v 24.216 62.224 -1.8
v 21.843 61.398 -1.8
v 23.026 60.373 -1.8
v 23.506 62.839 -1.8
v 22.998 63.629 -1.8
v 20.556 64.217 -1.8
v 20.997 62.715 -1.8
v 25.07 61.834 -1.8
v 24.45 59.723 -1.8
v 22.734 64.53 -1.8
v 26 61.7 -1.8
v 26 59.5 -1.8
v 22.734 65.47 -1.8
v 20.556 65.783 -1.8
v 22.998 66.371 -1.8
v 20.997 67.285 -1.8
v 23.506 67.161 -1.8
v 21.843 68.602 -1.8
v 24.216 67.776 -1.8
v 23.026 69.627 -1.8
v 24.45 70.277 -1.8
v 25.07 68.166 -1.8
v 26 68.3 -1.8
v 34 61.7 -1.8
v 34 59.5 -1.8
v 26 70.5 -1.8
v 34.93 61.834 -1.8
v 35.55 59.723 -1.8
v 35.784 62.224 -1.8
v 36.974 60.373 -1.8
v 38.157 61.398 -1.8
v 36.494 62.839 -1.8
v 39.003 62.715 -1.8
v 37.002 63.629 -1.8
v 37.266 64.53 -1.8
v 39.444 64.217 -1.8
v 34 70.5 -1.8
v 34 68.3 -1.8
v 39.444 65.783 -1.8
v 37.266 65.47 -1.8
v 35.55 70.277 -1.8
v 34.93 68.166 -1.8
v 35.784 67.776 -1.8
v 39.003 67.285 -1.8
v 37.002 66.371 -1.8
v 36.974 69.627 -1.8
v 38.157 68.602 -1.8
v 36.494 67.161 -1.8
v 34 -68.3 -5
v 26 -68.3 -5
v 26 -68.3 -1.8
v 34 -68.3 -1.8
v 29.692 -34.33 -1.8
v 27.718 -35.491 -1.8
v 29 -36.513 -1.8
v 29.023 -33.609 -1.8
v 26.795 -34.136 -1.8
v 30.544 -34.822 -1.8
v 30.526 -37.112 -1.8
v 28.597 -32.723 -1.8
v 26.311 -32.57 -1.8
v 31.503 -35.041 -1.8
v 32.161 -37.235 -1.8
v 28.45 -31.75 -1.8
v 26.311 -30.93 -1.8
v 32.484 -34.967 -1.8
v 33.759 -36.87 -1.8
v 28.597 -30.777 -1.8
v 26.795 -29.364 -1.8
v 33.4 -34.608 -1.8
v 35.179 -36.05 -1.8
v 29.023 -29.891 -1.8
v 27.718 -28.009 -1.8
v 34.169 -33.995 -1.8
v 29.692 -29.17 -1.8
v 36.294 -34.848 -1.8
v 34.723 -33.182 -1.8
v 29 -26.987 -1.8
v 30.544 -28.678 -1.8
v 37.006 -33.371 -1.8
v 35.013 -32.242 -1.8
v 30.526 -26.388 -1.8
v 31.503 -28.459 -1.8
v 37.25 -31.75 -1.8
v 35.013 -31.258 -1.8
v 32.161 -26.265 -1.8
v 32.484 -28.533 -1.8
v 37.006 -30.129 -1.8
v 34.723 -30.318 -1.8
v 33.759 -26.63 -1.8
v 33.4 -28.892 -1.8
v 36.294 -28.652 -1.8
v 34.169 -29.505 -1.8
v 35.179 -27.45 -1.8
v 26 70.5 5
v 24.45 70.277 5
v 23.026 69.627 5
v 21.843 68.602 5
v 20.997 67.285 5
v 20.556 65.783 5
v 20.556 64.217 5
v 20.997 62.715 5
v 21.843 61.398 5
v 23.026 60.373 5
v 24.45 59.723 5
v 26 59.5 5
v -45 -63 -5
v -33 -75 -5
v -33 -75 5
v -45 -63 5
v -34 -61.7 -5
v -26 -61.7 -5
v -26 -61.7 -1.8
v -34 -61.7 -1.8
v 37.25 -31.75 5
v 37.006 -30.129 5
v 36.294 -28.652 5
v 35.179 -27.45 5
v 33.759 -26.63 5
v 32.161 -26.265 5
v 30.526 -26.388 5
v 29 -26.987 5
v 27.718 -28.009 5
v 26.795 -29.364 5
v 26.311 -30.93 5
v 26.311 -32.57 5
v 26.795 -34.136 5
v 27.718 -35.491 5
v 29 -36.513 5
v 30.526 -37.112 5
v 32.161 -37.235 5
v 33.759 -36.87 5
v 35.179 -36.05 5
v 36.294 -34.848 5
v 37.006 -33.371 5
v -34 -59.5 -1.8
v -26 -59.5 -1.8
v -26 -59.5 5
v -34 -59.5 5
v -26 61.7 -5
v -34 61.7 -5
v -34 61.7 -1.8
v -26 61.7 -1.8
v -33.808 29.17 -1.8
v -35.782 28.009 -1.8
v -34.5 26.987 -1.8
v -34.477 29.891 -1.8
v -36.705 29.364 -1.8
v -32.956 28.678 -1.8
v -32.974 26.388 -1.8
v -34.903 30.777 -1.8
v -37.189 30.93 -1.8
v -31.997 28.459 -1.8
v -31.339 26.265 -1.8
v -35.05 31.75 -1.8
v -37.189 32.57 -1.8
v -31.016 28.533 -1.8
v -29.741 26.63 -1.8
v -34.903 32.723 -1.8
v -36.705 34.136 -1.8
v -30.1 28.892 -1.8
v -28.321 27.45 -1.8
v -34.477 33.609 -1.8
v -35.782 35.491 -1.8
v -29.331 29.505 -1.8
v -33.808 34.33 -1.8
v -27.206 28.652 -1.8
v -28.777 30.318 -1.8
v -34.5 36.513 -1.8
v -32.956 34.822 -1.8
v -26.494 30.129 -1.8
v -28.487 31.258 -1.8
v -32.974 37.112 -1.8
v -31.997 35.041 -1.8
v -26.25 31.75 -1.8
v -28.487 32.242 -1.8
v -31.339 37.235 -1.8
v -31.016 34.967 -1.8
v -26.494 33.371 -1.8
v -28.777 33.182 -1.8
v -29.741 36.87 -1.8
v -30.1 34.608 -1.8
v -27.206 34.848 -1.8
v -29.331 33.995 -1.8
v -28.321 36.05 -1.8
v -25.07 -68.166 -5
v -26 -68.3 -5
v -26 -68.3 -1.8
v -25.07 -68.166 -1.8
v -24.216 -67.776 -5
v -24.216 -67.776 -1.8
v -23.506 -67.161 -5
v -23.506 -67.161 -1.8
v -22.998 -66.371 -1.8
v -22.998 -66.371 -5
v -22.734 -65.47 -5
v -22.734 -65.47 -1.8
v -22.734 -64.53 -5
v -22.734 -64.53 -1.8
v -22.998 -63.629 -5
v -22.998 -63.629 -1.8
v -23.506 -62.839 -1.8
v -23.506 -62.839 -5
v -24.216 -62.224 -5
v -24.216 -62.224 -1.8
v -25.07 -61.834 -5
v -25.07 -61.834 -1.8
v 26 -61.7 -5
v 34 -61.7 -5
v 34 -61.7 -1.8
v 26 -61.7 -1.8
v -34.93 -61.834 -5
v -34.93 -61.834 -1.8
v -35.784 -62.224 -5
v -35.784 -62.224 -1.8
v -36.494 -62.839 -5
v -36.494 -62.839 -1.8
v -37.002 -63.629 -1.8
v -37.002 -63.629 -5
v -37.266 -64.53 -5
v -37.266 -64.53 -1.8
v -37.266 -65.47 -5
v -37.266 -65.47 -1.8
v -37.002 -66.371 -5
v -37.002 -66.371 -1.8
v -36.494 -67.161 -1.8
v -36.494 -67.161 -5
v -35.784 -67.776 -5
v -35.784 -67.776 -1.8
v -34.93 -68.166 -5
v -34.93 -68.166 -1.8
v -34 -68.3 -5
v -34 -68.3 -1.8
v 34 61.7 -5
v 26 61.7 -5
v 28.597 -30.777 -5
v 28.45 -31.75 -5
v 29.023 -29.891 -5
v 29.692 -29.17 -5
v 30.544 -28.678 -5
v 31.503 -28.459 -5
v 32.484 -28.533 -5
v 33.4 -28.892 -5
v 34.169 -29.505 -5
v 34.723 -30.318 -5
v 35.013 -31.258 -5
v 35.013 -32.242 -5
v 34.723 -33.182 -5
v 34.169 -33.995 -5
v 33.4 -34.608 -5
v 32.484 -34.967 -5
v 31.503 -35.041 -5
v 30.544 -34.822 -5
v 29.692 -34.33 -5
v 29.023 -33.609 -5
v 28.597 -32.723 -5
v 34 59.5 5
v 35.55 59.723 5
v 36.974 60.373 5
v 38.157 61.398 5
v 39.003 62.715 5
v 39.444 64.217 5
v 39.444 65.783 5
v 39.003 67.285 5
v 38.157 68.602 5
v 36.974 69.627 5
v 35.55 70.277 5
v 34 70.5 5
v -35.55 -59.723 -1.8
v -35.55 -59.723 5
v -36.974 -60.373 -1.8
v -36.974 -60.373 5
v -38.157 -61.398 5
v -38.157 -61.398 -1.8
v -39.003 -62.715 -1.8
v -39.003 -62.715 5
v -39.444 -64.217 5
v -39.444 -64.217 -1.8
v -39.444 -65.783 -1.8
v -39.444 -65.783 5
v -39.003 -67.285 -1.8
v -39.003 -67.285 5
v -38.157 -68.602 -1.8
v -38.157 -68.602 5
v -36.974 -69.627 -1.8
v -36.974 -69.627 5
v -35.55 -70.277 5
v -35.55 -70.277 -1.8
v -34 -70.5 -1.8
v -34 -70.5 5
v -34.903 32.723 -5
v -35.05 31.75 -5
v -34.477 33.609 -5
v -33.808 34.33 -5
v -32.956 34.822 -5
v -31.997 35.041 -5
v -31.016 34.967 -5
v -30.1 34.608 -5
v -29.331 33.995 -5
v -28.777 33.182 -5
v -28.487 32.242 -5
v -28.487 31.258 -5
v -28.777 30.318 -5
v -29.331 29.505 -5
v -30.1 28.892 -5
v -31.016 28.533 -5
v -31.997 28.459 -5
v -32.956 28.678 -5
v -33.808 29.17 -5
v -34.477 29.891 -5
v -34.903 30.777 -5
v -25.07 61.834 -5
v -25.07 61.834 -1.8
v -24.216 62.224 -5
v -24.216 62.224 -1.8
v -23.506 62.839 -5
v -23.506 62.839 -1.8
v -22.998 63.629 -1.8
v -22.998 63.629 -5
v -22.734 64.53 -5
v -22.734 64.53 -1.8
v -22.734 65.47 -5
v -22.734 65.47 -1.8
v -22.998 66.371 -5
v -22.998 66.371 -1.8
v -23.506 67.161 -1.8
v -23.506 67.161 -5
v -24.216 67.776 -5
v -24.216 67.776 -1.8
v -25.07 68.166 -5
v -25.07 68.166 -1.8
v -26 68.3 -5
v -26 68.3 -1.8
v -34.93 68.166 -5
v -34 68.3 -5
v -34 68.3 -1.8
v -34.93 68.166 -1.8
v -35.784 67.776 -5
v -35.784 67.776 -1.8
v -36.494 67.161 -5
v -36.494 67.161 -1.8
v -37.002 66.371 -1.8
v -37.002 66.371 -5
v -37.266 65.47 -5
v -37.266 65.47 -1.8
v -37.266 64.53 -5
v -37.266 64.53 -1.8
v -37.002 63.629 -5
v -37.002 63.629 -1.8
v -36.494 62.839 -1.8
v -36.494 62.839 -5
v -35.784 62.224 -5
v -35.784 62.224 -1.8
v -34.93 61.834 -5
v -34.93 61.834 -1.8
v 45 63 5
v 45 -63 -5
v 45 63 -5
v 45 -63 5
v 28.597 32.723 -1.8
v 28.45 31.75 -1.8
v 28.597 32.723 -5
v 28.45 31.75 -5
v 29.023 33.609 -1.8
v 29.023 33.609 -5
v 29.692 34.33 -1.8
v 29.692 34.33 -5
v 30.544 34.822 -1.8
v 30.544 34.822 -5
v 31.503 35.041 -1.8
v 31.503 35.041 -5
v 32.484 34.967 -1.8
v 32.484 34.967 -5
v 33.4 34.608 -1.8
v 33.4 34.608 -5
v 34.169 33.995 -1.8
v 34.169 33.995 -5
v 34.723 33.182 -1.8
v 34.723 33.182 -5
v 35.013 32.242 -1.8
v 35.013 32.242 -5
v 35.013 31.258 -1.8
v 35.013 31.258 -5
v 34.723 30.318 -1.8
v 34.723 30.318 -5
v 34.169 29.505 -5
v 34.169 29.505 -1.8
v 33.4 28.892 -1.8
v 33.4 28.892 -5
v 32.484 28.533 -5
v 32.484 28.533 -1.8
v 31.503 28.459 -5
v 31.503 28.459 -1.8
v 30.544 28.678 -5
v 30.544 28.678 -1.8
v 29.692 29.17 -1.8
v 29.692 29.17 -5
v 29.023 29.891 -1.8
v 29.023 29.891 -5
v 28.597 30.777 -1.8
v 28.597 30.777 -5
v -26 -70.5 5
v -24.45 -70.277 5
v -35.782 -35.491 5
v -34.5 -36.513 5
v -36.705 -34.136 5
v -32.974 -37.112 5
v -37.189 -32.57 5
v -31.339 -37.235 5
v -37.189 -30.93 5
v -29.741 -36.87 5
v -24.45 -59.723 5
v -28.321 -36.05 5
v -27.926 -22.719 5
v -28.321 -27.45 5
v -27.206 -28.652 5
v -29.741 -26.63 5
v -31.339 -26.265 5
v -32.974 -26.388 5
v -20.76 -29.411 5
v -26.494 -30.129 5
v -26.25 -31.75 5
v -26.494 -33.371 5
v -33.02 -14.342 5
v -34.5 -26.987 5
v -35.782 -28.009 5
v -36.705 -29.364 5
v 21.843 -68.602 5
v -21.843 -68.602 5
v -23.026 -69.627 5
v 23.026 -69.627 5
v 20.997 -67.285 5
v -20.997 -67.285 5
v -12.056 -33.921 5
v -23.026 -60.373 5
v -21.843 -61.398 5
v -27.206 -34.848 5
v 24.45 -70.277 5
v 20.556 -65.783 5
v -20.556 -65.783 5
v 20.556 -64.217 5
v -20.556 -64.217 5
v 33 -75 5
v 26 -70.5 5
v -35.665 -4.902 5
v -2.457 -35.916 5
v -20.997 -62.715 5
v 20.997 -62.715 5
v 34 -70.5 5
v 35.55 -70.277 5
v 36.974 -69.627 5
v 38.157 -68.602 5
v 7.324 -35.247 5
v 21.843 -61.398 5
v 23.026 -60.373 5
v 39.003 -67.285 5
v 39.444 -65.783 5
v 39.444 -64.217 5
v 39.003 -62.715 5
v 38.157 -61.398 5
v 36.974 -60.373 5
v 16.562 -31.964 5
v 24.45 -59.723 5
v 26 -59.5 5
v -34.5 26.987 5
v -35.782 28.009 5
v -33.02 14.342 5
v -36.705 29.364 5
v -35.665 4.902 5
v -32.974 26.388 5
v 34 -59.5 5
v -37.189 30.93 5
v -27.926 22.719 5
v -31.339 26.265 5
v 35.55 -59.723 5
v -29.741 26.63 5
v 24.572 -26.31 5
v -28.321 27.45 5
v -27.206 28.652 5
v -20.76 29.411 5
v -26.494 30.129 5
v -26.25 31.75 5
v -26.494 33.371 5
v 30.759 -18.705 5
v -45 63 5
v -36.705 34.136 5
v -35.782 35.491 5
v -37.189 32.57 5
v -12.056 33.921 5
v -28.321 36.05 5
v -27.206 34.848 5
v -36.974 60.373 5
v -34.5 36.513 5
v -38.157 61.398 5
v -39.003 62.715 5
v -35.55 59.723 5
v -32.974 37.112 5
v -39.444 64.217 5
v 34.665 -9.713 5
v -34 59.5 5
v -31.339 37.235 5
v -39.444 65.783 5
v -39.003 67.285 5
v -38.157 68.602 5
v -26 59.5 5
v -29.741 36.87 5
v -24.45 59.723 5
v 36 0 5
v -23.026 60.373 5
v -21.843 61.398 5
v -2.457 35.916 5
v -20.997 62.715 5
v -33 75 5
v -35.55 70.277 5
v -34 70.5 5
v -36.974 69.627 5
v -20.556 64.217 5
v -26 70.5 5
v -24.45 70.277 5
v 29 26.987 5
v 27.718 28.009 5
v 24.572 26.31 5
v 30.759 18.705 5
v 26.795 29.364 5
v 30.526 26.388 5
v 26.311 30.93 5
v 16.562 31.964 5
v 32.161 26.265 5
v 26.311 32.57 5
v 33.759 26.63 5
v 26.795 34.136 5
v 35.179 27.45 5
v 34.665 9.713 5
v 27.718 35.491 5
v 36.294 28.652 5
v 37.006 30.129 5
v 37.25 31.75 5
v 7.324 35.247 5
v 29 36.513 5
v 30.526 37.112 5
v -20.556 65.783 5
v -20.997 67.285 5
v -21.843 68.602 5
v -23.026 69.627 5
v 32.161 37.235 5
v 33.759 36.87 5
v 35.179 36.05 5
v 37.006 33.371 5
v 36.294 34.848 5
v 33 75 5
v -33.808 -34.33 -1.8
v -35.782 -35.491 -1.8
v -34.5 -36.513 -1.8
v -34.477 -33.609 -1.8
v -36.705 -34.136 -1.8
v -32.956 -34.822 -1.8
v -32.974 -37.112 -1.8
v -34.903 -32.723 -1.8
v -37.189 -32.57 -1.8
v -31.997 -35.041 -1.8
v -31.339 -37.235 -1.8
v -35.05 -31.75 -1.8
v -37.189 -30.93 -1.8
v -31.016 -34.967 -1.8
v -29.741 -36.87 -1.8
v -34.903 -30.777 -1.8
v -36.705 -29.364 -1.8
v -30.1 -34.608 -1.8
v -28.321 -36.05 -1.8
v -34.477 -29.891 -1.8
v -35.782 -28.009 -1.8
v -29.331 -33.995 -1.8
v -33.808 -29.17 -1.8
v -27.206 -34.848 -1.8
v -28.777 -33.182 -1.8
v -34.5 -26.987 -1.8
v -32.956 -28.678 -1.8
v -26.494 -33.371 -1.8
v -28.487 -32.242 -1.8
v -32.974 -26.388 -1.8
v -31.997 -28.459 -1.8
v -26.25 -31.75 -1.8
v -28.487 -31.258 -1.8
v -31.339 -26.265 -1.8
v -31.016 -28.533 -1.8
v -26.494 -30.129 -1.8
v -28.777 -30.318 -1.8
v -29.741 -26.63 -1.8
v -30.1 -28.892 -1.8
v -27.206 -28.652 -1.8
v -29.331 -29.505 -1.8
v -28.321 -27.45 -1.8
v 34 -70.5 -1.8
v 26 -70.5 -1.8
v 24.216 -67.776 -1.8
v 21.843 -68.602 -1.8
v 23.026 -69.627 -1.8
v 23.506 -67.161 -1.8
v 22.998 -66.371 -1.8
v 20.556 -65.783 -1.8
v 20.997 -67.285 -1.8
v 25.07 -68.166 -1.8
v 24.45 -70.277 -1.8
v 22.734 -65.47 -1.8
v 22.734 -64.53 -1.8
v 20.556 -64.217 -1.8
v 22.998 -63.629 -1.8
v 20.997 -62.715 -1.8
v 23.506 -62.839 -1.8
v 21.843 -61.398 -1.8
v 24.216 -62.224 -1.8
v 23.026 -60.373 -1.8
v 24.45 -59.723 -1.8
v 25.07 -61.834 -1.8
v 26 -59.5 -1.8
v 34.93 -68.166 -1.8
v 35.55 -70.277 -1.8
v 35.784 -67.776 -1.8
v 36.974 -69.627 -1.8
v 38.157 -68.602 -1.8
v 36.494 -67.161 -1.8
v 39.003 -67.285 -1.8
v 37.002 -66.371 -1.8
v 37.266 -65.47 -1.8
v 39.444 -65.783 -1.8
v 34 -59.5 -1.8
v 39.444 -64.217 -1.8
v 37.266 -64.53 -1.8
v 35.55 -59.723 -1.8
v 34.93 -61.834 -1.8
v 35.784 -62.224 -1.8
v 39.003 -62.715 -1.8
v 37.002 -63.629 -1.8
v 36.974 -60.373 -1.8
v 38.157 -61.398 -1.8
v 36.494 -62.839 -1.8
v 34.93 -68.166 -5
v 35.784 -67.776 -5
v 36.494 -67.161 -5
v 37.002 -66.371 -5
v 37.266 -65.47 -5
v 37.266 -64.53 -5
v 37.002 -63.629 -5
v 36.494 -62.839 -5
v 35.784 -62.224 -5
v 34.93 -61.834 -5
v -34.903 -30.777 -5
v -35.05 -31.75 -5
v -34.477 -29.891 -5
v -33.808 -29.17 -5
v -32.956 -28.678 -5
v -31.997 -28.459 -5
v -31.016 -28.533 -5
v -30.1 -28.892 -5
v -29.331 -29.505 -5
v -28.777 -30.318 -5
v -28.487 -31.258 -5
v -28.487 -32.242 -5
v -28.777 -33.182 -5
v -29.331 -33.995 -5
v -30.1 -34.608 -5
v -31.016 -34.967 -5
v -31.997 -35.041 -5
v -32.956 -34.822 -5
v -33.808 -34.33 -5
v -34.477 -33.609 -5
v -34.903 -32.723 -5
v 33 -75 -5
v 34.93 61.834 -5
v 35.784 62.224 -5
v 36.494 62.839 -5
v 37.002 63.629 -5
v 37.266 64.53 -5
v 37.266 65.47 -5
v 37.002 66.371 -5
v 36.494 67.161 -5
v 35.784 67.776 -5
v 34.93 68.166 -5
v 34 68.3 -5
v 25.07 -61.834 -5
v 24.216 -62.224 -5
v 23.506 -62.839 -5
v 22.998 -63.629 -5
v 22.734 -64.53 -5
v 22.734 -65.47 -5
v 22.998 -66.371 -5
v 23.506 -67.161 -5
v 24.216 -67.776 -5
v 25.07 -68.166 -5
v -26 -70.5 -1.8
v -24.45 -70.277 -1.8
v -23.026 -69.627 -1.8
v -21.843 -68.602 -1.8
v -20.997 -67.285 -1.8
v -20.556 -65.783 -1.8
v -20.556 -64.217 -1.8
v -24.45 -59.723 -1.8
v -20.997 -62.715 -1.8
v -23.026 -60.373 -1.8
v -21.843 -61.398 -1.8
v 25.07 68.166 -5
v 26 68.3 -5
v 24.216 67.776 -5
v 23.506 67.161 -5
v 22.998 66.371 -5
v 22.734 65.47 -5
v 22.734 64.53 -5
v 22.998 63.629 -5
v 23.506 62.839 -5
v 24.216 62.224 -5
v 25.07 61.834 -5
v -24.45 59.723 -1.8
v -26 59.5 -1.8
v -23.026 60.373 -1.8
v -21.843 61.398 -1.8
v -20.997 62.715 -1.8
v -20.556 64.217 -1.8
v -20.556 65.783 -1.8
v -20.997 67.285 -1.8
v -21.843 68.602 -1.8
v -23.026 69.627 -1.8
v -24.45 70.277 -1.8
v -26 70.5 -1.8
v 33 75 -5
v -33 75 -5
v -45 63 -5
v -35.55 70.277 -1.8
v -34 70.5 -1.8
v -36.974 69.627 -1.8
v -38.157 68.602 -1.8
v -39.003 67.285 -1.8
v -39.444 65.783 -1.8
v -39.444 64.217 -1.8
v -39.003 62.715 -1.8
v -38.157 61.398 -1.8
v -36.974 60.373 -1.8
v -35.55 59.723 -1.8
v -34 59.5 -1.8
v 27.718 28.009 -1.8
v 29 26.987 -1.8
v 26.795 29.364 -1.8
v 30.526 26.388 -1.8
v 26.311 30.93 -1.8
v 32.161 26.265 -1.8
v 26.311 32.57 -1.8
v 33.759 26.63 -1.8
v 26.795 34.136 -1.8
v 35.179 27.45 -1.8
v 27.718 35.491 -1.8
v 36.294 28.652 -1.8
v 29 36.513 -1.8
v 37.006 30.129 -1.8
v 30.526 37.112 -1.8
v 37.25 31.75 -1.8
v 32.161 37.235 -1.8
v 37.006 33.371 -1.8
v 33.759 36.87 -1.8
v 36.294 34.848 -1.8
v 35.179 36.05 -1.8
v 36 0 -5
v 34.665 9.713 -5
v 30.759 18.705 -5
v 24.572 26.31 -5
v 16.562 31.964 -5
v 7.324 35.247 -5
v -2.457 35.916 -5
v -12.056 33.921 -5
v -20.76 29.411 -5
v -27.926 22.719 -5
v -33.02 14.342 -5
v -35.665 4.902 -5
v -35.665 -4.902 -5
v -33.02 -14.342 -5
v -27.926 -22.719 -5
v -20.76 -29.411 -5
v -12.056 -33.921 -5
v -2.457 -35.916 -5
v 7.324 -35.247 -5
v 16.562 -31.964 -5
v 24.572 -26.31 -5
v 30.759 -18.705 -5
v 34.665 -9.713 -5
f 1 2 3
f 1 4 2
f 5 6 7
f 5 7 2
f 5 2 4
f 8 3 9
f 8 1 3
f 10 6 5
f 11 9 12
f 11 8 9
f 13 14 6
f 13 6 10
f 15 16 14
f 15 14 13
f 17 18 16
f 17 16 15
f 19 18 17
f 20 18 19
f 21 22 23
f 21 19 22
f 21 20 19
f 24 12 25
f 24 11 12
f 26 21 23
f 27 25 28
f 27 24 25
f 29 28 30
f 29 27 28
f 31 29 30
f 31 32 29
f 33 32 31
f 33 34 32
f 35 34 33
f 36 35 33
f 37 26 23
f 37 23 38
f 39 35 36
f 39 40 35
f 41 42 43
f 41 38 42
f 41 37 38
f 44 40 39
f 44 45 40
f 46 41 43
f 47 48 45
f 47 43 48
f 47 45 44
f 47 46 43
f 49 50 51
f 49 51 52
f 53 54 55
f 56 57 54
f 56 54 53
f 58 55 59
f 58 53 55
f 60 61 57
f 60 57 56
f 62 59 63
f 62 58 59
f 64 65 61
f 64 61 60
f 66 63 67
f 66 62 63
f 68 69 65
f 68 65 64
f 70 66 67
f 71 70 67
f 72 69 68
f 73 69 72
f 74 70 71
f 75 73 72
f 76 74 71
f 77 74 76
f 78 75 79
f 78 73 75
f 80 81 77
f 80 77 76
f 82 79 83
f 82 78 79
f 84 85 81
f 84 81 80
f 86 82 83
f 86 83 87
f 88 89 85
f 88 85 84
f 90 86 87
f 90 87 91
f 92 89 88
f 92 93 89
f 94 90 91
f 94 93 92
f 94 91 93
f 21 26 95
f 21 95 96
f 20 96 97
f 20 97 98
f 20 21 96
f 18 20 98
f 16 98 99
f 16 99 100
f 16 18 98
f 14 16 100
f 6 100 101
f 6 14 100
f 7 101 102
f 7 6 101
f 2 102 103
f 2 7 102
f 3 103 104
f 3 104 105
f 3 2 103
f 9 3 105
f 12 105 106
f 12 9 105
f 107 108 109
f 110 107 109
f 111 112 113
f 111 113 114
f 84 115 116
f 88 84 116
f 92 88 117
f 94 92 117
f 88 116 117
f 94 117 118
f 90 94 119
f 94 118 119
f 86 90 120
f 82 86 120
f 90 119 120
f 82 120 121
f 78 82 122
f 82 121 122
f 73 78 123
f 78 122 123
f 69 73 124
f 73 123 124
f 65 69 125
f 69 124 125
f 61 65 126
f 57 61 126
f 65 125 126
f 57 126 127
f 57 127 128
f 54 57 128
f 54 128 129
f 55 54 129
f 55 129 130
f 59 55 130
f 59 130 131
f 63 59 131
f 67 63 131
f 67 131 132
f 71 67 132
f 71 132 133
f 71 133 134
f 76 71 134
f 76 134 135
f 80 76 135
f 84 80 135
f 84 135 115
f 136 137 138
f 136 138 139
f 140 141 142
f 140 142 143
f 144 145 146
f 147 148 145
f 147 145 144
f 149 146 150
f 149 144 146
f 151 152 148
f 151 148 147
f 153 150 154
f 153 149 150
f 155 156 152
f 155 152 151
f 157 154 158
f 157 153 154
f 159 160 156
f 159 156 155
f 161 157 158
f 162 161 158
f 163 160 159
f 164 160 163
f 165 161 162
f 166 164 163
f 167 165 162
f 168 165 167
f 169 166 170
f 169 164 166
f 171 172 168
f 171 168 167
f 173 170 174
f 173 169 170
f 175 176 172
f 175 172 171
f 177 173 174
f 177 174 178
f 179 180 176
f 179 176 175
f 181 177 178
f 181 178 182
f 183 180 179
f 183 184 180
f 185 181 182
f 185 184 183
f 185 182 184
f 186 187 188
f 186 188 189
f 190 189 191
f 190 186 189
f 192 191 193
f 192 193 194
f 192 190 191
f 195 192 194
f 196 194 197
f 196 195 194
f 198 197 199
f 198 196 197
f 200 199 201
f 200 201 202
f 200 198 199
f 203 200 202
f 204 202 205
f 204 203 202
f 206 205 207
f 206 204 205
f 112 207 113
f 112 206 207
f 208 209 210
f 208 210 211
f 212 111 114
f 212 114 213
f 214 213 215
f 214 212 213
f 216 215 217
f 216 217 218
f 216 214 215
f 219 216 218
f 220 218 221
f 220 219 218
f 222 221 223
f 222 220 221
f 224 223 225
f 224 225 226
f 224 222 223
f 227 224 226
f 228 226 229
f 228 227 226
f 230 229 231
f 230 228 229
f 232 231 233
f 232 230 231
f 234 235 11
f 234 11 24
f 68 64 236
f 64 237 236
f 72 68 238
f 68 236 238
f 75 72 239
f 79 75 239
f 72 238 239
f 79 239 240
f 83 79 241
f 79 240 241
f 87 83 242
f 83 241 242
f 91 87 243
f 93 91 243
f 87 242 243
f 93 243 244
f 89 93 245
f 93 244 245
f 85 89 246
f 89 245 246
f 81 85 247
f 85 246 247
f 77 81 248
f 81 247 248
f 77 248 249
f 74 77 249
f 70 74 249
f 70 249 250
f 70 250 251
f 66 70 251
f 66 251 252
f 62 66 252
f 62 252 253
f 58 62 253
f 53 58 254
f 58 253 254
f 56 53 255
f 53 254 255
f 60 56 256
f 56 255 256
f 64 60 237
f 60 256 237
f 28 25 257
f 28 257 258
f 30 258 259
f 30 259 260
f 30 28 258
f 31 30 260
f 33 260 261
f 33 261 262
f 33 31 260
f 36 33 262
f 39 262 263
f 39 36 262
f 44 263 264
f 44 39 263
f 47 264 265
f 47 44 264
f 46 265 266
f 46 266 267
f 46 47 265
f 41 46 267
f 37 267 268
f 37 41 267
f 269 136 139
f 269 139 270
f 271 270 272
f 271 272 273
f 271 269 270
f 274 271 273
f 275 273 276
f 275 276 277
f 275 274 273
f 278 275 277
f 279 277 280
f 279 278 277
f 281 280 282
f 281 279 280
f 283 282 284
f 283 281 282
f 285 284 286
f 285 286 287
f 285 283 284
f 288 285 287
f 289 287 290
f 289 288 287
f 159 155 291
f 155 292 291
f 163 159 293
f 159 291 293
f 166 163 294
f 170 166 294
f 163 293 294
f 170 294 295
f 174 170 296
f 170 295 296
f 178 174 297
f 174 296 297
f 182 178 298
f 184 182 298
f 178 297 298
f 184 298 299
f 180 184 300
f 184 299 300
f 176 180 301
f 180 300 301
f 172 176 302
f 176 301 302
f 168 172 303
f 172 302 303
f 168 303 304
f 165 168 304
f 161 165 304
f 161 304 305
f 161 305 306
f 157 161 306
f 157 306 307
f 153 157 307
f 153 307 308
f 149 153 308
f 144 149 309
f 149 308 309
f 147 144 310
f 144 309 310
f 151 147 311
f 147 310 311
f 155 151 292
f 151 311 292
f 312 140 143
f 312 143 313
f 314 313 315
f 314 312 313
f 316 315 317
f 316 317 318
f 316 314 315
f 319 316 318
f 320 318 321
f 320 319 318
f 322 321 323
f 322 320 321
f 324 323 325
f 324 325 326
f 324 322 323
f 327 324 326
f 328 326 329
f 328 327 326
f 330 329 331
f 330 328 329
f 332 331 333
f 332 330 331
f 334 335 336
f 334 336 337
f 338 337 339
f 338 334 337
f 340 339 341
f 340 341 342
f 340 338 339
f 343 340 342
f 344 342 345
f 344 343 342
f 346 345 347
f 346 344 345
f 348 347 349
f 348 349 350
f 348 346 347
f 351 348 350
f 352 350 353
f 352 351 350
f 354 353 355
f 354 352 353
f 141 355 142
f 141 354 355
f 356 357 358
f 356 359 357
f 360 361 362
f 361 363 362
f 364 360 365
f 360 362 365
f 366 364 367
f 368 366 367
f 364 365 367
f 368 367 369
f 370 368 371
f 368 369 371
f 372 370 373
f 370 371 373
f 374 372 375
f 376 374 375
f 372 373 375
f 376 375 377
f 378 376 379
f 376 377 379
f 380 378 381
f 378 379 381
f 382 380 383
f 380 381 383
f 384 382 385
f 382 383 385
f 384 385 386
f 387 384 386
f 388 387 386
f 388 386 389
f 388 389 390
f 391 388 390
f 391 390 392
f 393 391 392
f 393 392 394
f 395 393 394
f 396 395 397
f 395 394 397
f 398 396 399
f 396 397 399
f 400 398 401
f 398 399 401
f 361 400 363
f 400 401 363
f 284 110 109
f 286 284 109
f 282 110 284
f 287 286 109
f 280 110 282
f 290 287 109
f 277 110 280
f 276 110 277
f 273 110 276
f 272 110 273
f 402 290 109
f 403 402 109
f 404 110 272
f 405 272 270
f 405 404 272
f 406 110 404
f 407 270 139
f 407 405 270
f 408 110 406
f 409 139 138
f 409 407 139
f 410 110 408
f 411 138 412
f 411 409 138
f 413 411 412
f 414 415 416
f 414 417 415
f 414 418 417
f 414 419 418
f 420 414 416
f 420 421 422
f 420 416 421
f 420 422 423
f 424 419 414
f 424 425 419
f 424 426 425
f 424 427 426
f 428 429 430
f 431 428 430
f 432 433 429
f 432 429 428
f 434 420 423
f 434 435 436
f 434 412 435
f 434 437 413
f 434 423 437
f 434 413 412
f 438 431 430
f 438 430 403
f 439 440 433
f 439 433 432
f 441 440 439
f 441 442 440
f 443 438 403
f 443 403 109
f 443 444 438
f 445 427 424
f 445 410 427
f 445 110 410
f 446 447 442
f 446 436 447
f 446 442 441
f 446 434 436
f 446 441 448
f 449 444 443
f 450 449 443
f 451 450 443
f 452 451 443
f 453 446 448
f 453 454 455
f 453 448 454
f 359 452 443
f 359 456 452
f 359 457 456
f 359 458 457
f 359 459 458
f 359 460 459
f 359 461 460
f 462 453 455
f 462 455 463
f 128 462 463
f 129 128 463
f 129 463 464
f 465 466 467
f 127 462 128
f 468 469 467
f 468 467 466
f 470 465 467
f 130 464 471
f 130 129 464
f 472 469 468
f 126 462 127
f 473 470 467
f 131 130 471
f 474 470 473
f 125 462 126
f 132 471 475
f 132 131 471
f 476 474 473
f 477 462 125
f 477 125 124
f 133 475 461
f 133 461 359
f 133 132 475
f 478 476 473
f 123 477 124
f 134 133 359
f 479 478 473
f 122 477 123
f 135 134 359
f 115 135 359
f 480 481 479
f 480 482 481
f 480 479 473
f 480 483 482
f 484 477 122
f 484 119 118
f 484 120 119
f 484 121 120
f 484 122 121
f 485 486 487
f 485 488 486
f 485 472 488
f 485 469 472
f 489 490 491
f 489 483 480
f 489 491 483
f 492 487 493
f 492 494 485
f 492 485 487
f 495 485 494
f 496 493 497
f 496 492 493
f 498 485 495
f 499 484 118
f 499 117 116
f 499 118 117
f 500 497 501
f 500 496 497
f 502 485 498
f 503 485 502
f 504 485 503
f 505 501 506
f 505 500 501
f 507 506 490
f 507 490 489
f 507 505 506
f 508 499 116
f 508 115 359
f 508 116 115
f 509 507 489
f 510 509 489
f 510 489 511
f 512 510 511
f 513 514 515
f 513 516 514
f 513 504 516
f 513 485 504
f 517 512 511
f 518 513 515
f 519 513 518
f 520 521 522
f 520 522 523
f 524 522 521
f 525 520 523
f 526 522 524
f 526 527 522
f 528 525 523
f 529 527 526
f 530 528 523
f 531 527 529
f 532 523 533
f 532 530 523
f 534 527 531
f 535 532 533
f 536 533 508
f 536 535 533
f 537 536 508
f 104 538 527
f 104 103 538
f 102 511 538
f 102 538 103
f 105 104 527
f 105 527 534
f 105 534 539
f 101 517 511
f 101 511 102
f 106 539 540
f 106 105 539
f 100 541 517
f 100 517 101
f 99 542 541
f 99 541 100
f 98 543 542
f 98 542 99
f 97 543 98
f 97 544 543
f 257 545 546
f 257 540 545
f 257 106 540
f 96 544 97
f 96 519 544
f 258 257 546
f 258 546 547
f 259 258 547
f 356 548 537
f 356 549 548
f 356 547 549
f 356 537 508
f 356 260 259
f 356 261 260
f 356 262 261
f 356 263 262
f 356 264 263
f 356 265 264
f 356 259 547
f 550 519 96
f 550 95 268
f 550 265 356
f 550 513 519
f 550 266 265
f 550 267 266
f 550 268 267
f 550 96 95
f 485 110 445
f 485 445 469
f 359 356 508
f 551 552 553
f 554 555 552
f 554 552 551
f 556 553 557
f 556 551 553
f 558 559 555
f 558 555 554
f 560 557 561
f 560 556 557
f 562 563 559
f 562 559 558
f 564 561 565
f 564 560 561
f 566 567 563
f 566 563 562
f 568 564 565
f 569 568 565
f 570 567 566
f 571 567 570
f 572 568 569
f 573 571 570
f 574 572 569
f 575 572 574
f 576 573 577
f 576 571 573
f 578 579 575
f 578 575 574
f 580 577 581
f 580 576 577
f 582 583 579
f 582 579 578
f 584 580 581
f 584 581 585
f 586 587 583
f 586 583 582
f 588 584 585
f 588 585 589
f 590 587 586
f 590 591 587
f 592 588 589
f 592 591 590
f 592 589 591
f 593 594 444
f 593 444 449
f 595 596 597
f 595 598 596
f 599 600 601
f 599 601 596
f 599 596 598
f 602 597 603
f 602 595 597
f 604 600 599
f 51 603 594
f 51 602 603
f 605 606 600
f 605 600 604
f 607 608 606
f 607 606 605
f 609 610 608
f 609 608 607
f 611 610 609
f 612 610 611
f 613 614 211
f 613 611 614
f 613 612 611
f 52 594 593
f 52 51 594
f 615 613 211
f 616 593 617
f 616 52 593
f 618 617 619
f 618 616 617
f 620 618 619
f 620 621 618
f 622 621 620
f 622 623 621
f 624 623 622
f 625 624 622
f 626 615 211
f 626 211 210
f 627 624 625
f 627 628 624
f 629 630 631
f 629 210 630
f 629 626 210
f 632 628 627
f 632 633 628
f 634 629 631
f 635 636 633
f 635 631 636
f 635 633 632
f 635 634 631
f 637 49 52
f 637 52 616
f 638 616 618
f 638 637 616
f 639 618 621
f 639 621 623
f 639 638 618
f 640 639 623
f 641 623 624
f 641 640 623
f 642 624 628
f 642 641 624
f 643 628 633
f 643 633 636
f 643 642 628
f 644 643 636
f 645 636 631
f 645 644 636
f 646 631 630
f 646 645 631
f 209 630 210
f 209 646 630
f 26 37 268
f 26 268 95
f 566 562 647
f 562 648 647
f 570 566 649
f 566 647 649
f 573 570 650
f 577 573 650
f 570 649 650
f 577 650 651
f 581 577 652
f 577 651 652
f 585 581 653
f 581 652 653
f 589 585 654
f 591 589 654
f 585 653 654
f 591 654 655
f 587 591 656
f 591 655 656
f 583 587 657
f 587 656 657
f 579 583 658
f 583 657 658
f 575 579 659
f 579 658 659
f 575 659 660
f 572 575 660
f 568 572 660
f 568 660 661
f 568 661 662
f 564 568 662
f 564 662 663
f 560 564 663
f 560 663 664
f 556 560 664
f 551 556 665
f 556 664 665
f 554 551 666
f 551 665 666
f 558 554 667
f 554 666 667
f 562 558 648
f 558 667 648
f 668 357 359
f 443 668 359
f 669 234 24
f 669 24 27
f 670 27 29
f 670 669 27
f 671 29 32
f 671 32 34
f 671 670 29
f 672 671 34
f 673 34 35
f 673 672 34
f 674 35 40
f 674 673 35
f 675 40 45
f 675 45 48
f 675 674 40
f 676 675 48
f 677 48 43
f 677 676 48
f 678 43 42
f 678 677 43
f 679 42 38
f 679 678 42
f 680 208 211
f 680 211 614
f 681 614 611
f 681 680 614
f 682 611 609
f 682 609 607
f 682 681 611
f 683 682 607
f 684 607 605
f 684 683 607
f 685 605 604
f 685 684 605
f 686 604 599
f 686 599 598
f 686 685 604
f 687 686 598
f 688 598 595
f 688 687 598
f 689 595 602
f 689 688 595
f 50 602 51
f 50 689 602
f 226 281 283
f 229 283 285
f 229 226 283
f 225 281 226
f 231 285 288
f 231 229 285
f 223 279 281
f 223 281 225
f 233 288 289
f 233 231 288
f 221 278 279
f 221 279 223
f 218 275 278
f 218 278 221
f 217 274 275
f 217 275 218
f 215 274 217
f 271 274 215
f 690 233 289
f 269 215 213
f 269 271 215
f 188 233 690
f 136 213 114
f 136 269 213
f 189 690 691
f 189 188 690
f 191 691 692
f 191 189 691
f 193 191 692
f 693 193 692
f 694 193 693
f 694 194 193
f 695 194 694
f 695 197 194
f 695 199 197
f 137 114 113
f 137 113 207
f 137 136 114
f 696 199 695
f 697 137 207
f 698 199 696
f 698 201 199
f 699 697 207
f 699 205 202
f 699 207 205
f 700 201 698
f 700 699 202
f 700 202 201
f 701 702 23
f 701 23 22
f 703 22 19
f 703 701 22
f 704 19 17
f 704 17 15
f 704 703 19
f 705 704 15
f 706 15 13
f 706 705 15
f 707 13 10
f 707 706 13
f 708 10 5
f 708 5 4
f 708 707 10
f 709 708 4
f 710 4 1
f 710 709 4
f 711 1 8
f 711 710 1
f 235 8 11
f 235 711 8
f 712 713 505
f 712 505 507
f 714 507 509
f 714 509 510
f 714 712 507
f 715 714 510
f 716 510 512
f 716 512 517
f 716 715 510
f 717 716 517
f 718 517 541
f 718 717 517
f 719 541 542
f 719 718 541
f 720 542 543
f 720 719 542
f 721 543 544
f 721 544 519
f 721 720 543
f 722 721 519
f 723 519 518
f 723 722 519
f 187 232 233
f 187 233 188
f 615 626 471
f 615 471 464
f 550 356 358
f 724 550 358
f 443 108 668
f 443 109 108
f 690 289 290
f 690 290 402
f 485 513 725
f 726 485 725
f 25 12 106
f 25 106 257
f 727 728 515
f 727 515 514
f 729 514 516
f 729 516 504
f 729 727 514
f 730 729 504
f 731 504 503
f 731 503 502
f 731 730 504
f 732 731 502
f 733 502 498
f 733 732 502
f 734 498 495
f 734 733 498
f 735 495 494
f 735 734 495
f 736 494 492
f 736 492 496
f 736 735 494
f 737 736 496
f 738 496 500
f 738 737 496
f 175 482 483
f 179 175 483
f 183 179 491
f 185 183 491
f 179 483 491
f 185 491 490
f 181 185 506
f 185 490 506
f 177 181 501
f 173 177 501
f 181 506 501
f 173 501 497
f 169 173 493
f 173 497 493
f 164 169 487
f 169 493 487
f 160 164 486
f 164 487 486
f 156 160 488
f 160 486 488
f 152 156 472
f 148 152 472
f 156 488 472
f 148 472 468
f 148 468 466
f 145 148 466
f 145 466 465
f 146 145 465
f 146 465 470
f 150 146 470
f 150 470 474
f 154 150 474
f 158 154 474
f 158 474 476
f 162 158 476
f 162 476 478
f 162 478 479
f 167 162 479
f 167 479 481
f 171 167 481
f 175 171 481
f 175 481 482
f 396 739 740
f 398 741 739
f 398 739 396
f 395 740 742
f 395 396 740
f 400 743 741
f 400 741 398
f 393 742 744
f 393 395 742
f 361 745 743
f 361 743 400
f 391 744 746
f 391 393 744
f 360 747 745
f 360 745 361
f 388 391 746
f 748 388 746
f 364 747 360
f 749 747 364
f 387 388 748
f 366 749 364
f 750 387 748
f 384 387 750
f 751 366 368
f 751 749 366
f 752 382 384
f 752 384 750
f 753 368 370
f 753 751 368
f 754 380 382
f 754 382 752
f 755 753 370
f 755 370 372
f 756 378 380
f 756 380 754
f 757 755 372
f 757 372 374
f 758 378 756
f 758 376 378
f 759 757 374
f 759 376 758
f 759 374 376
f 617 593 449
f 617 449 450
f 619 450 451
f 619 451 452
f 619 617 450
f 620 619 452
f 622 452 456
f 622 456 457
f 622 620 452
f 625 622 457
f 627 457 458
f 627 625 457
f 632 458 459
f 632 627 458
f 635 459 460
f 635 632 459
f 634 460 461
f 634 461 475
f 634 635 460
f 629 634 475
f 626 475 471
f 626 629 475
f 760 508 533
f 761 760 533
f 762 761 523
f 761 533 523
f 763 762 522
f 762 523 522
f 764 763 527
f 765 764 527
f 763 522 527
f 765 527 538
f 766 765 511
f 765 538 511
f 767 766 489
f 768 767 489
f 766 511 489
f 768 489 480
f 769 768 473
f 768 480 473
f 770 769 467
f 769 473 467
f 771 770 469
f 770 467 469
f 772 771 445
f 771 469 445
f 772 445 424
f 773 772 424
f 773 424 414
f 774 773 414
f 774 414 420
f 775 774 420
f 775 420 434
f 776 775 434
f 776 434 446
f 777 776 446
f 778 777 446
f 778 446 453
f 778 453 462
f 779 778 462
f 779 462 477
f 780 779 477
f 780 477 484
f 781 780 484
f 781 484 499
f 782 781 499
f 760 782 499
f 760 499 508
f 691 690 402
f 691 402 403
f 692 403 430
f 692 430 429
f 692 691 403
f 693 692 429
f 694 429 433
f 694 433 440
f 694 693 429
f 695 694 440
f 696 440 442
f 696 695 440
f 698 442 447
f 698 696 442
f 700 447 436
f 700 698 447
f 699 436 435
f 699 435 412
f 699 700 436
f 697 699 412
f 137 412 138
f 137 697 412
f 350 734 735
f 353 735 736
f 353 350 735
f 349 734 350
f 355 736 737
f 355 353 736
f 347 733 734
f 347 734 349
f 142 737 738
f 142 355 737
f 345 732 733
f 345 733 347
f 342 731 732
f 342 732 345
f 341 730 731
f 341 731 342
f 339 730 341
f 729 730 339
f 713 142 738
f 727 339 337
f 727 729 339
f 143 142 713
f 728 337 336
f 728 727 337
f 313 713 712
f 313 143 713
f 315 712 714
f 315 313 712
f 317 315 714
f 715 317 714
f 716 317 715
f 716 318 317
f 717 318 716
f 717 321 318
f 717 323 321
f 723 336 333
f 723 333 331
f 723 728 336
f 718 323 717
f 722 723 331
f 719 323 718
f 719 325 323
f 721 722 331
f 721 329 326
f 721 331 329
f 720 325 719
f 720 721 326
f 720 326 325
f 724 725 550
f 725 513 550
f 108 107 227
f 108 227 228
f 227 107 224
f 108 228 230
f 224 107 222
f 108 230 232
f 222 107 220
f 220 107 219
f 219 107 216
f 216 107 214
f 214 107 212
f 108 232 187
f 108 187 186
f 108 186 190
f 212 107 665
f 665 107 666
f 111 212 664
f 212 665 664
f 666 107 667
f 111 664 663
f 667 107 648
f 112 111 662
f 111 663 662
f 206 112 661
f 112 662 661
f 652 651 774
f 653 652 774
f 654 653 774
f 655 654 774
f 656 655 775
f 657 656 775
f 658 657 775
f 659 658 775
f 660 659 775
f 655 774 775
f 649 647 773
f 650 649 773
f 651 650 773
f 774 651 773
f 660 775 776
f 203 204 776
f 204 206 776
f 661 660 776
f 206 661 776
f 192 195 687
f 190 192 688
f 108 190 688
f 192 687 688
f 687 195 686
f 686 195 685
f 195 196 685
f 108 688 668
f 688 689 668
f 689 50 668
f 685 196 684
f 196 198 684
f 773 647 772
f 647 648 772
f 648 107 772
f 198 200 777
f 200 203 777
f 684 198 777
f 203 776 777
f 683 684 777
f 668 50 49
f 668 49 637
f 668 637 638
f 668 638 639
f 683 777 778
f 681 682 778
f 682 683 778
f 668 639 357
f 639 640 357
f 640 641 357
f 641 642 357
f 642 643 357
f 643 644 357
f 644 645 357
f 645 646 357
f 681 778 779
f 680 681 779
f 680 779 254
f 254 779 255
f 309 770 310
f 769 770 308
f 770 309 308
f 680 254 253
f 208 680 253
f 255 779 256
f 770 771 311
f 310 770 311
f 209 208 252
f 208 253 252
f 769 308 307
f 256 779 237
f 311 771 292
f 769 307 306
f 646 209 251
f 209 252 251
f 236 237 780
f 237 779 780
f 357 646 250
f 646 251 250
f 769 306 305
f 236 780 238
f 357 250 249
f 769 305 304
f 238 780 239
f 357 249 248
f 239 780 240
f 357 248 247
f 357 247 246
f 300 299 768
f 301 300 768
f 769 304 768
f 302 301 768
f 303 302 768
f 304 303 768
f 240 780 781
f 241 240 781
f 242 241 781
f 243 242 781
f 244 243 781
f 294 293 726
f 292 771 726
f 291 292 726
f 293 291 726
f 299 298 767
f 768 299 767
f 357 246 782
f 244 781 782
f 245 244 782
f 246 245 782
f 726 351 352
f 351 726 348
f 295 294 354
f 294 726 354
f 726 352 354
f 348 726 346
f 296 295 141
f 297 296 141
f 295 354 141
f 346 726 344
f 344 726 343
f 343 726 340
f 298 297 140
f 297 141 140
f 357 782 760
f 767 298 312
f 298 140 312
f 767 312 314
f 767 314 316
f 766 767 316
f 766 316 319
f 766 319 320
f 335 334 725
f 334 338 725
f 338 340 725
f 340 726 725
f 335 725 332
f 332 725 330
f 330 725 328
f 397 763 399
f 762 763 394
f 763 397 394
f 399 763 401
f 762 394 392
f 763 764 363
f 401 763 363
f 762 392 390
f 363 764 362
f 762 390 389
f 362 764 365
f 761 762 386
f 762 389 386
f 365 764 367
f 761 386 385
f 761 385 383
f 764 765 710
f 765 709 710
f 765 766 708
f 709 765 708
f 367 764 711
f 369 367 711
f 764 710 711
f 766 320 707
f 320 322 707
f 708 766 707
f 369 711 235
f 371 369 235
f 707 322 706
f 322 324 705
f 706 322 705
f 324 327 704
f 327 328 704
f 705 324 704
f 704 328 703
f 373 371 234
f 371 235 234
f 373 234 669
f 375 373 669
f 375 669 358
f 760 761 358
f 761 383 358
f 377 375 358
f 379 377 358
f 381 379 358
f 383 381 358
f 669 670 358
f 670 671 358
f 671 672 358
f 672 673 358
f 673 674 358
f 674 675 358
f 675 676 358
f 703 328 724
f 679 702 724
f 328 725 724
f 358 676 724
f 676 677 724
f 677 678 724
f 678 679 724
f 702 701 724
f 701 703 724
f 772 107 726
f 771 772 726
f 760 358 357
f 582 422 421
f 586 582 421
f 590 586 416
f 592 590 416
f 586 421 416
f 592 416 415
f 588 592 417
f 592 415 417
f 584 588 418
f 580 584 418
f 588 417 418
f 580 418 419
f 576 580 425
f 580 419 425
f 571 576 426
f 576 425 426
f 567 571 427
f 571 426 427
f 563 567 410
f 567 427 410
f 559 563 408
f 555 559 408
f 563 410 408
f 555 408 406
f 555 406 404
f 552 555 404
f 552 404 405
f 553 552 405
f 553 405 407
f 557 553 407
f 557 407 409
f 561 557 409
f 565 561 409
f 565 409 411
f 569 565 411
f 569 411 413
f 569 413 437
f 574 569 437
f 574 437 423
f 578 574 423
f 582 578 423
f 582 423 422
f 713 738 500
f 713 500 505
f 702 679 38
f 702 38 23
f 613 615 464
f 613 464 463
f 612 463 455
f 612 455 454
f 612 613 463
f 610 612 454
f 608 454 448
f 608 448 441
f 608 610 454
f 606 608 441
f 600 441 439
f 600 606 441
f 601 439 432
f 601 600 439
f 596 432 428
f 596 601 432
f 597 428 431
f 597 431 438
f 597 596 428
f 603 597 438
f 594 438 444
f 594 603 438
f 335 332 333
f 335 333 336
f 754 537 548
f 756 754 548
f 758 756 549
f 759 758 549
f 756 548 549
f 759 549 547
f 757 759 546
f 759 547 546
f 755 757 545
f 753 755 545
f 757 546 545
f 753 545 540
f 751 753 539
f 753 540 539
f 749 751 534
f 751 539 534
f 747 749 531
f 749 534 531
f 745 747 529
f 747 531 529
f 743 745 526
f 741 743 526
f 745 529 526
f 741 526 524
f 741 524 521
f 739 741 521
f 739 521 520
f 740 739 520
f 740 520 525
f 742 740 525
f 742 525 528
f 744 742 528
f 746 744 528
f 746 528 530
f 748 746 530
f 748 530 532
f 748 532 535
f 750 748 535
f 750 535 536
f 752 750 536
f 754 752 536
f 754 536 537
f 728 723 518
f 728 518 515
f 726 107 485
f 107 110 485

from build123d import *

# Parameters (mm, degrees)
SKETCH_1_W                = 90
SKETCH_1_H                = 150
EXTRUDE_1_DEPTH           = 5
SKETCH_4_R                = 36
CUT_EXTRUDE_1_DEPTH       = 89.034084308
HOLE_WIZARD_3_D           = 6.6
HOLE_WIZARD_3_CBORE_D     = 11
HOLE_WIZARD_3_CBORE_DEPTH = 6.8
HOLE_START                = -1.8
HOLE_WIZARD_2_DEPTH       = 6.8
HOLE_START_2              = -5
HOLE_WIZARD_2_2_DEPTH     = 3.2
CHAMFER_1_SIZE            = 12


# Read off the part's stored shape, not the designer's step: 打孔尺寸(%根据)内六角圆柱头螺钉的类型2
with BuildPart() as part:
    # 草图1 → 凸台-拉伸1 (new, symmetric)
    with BuildSketch(Plane.XY):
        Rectangle(SKETCH_1_W, SKETCH_1_H)
    extrude(amount=EXTRUDE_1_DEPTH, both=True)

    # 草图4 → 切除-拉伸1 (cut, through all)
    with BuildSketch(Plane.XY.offset(5)):
        Circle(SKETCH_4_R)
    extrude(amount=-CUT_EXTRUDE_1_DEPTH, mode=Mode.SUBTRACT)

    # 打孔尺寸(%根据)内六角圆柱头螺钉的类型3 (through all)
    with Locations(Plane(origin=(-31.75, 31.75, 5), x_dir=(1, 0, 0), z_dir=(0, 0, 1))):
        with Locations((0, 0), (63.5, 0), (0, -63.5), (63.5, -63.5)):
            CounterBoreHole(HOLE_WIZARD_3_D / 2, HOLE_WIZARD_3_CBORE_D / 2, HOLE_WIZARD_3_CBORE_DEPTH)

    # 打孔尺寸(%根据)内六角圆柱头螺钉的类型2 outline → 打孔尺寸(%根据)内六角圆柱头螺钉的类型2 (cut)
    with BuildSketch(Plane.XY.offset(HOLE_START)):
        with BuildLine():
            Line((-34, 59.5), (-26, 59.5))
            ThreePointArc((-26, 59.5), (-20.5, 65), (-26, 70.5))
            Line((-26, 70.5), (-34, 70.5))
            ThreePointArc((-34, 70.5), (-39.5, 65), (-34, 59.5))
        make_face()
        with BuildLine():
            ThreePointArc((34, 59.5), (39.5, 65), (34, 70.5))
            Line((34, 70.5), (26, 70.5))
            ThreePointArc((26, 70.5), (20.5, 65), (26, 59.5))
            Line((26, 59.5), (34, 59.5))
        make_face()
        with BuildLine():
            Line((-34, -70.5), (-26, -70.5))
            ThreePointArc((-26, -70.5), (-20.5, -65), (-26, -59.5))
            Line((-26, -59.5), (-34, -59.5))
            ThreePointArc((-34, -59.5), (-39.5, -65), (-34, -70.5))
        make_face()
        with BuildLine():
            ThreePointArc((34, -70.5), (39.5, -65), (34, -59.5))
            Line((34, -59.5), (26, -59.5))
            ThreePointArc((26, -59.5), (20.5, -65), (26, -70.5))
            Line((26, -70.5), (34, -70.5))
        make_face()
    extrude(amount=HOLE_WIZARD_2_DEPTH, mode=Mode.SUBTRACT)

    # Hole Wizard 2 2 outline → Hole Wizard 2 2 (cut)
    with BuildSketch(Plane.XY.offset(HOLE_START_2)):
        with BuildLine():
            Line((-34, 61.7), (-26, 61.7))
            ThreePointArc((-26, 61.7), (-22.7, 65), (-26, 68.3))
            Line((-26, 68.3), (-34, 68.3))
            ThreePointArc((-34, 68.3), (-37.3, 65), (-34, 61.7))
        make_face()
        with BuildLine():
            ThreePointArc((34, 61.7), (37.3, 65), (34, 68.3))
            Line((34, 68.3), (26, 68.3))
            ThreePointArc((26, 68.3), (22.7, 65), (26, 61.7))
            Line((26, 61.7), (34, 61.7))
        make_face()
        with BuildLine():
            Line((-34, -68.3), (-26, -68.3))
            ThreePointArc((-26, -68.3), (-22.7, -65), (-26, -61.7))
            Line((-26, -61.7), (-34, -61.7))
            ThreePointArc((-34, -61.7), (-37.3, -65), (-34, -68.3))
        make_face()
        with BuildLine():
            ThreePointArc((34, -68.3), (37.3, -65), (34, -61.7))
            Line((34, -61.7), (26, -61.7))
            ThreePointArc((26, -61.7), (22.7, -65), (26, -68.3))
            Line((26, -68.3), (34, -68.3))
        make_face()
    extrude(amount=HOLE_WIZARD_2_2_DEPTH, mode=Mode.SUBTRACT)

    # 倒角1
    chamfer_1_edges = [part.edges().sort_by_distance(p)[0] for p in [
        (45, -75, 0),
        (-45, -75, 0),
        (-45, 75, 0),
        (45, 75, 0),
    ]]
    chamfer(chamfer_1_edges, length=CHAMFER_1_SIZE)


solid = part.part
